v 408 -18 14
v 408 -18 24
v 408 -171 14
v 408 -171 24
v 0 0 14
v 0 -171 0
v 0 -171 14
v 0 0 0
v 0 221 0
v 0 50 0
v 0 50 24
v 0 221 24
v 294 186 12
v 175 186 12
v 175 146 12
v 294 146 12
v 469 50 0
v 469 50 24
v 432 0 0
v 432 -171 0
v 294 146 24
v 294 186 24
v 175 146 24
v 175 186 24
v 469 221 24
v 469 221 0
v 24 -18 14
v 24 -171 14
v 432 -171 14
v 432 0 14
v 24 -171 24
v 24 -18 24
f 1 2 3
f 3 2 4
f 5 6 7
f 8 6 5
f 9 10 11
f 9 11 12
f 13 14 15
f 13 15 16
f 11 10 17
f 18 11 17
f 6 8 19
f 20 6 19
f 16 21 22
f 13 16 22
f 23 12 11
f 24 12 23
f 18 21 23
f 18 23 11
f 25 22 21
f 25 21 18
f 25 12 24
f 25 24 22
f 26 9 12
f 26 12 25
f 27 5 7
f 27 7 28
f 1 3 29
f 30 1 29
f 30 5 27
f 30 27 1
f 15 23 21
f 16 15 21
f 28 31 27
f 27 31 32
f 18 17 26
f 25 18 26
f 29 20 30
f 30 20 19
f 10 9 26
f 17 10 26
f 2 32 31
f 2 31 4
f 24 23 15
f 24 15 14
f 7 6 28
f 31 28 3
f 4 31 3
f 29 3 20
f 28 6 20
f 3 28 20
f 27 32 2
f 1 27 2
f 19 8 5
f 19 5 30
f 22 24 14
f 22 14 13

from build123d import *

# Parameters (mm, degrees)
F0_W     = 432
F0_H     = 171
F1_DEPTH = 24
F3_DEPTH = 10
F4_W     = 469
F4_H     = 171
F5_DEPTH = 24
F6_W     = 119
F6_H     = 40
F7_DEPTH = 12


with BuildPart() as f1:
    # F0 (on Top) → F1 (new body)
    with BuildSketch(Plane.XY):
        with Locations((216, -85.5)):
            Rectangle(F0_W, F0_H)
    extrude(amount=F1_DEPTH)

    # F2 (on face) → F3 (cut)
    with BuildSketch(Plane.XY.offset(24)):
        Polygon((0, 0), (0, -171), (24, -171), (24, -18), (408, -18), (408, -171), (432, -171), (432, 0), align=None)
    extrude(amount=-F3_DEPTH, mode=Mode.SUBTRACT)


with BuildPart() as f5:
    # F4 (on Top) → F5 (new body)
    with BuildSketch(Plane.XY):
        with Locations((234.5, 135.5)):
            Rectangle(F4_W, F4_H)
    extrude(amount=F5_DEPTH)

    # F6 (on face) → F7 (cut)
    with BuildSketch(Plane.XY.offset(24)):
        with Locations((234.5, 166)):
            Rectangle(F6_W, F6_H)
    extrude(amount=-F7_DEPTH, mode=Mode.SUBTRACT)


solid = Compound([f1.part, f5.part])
